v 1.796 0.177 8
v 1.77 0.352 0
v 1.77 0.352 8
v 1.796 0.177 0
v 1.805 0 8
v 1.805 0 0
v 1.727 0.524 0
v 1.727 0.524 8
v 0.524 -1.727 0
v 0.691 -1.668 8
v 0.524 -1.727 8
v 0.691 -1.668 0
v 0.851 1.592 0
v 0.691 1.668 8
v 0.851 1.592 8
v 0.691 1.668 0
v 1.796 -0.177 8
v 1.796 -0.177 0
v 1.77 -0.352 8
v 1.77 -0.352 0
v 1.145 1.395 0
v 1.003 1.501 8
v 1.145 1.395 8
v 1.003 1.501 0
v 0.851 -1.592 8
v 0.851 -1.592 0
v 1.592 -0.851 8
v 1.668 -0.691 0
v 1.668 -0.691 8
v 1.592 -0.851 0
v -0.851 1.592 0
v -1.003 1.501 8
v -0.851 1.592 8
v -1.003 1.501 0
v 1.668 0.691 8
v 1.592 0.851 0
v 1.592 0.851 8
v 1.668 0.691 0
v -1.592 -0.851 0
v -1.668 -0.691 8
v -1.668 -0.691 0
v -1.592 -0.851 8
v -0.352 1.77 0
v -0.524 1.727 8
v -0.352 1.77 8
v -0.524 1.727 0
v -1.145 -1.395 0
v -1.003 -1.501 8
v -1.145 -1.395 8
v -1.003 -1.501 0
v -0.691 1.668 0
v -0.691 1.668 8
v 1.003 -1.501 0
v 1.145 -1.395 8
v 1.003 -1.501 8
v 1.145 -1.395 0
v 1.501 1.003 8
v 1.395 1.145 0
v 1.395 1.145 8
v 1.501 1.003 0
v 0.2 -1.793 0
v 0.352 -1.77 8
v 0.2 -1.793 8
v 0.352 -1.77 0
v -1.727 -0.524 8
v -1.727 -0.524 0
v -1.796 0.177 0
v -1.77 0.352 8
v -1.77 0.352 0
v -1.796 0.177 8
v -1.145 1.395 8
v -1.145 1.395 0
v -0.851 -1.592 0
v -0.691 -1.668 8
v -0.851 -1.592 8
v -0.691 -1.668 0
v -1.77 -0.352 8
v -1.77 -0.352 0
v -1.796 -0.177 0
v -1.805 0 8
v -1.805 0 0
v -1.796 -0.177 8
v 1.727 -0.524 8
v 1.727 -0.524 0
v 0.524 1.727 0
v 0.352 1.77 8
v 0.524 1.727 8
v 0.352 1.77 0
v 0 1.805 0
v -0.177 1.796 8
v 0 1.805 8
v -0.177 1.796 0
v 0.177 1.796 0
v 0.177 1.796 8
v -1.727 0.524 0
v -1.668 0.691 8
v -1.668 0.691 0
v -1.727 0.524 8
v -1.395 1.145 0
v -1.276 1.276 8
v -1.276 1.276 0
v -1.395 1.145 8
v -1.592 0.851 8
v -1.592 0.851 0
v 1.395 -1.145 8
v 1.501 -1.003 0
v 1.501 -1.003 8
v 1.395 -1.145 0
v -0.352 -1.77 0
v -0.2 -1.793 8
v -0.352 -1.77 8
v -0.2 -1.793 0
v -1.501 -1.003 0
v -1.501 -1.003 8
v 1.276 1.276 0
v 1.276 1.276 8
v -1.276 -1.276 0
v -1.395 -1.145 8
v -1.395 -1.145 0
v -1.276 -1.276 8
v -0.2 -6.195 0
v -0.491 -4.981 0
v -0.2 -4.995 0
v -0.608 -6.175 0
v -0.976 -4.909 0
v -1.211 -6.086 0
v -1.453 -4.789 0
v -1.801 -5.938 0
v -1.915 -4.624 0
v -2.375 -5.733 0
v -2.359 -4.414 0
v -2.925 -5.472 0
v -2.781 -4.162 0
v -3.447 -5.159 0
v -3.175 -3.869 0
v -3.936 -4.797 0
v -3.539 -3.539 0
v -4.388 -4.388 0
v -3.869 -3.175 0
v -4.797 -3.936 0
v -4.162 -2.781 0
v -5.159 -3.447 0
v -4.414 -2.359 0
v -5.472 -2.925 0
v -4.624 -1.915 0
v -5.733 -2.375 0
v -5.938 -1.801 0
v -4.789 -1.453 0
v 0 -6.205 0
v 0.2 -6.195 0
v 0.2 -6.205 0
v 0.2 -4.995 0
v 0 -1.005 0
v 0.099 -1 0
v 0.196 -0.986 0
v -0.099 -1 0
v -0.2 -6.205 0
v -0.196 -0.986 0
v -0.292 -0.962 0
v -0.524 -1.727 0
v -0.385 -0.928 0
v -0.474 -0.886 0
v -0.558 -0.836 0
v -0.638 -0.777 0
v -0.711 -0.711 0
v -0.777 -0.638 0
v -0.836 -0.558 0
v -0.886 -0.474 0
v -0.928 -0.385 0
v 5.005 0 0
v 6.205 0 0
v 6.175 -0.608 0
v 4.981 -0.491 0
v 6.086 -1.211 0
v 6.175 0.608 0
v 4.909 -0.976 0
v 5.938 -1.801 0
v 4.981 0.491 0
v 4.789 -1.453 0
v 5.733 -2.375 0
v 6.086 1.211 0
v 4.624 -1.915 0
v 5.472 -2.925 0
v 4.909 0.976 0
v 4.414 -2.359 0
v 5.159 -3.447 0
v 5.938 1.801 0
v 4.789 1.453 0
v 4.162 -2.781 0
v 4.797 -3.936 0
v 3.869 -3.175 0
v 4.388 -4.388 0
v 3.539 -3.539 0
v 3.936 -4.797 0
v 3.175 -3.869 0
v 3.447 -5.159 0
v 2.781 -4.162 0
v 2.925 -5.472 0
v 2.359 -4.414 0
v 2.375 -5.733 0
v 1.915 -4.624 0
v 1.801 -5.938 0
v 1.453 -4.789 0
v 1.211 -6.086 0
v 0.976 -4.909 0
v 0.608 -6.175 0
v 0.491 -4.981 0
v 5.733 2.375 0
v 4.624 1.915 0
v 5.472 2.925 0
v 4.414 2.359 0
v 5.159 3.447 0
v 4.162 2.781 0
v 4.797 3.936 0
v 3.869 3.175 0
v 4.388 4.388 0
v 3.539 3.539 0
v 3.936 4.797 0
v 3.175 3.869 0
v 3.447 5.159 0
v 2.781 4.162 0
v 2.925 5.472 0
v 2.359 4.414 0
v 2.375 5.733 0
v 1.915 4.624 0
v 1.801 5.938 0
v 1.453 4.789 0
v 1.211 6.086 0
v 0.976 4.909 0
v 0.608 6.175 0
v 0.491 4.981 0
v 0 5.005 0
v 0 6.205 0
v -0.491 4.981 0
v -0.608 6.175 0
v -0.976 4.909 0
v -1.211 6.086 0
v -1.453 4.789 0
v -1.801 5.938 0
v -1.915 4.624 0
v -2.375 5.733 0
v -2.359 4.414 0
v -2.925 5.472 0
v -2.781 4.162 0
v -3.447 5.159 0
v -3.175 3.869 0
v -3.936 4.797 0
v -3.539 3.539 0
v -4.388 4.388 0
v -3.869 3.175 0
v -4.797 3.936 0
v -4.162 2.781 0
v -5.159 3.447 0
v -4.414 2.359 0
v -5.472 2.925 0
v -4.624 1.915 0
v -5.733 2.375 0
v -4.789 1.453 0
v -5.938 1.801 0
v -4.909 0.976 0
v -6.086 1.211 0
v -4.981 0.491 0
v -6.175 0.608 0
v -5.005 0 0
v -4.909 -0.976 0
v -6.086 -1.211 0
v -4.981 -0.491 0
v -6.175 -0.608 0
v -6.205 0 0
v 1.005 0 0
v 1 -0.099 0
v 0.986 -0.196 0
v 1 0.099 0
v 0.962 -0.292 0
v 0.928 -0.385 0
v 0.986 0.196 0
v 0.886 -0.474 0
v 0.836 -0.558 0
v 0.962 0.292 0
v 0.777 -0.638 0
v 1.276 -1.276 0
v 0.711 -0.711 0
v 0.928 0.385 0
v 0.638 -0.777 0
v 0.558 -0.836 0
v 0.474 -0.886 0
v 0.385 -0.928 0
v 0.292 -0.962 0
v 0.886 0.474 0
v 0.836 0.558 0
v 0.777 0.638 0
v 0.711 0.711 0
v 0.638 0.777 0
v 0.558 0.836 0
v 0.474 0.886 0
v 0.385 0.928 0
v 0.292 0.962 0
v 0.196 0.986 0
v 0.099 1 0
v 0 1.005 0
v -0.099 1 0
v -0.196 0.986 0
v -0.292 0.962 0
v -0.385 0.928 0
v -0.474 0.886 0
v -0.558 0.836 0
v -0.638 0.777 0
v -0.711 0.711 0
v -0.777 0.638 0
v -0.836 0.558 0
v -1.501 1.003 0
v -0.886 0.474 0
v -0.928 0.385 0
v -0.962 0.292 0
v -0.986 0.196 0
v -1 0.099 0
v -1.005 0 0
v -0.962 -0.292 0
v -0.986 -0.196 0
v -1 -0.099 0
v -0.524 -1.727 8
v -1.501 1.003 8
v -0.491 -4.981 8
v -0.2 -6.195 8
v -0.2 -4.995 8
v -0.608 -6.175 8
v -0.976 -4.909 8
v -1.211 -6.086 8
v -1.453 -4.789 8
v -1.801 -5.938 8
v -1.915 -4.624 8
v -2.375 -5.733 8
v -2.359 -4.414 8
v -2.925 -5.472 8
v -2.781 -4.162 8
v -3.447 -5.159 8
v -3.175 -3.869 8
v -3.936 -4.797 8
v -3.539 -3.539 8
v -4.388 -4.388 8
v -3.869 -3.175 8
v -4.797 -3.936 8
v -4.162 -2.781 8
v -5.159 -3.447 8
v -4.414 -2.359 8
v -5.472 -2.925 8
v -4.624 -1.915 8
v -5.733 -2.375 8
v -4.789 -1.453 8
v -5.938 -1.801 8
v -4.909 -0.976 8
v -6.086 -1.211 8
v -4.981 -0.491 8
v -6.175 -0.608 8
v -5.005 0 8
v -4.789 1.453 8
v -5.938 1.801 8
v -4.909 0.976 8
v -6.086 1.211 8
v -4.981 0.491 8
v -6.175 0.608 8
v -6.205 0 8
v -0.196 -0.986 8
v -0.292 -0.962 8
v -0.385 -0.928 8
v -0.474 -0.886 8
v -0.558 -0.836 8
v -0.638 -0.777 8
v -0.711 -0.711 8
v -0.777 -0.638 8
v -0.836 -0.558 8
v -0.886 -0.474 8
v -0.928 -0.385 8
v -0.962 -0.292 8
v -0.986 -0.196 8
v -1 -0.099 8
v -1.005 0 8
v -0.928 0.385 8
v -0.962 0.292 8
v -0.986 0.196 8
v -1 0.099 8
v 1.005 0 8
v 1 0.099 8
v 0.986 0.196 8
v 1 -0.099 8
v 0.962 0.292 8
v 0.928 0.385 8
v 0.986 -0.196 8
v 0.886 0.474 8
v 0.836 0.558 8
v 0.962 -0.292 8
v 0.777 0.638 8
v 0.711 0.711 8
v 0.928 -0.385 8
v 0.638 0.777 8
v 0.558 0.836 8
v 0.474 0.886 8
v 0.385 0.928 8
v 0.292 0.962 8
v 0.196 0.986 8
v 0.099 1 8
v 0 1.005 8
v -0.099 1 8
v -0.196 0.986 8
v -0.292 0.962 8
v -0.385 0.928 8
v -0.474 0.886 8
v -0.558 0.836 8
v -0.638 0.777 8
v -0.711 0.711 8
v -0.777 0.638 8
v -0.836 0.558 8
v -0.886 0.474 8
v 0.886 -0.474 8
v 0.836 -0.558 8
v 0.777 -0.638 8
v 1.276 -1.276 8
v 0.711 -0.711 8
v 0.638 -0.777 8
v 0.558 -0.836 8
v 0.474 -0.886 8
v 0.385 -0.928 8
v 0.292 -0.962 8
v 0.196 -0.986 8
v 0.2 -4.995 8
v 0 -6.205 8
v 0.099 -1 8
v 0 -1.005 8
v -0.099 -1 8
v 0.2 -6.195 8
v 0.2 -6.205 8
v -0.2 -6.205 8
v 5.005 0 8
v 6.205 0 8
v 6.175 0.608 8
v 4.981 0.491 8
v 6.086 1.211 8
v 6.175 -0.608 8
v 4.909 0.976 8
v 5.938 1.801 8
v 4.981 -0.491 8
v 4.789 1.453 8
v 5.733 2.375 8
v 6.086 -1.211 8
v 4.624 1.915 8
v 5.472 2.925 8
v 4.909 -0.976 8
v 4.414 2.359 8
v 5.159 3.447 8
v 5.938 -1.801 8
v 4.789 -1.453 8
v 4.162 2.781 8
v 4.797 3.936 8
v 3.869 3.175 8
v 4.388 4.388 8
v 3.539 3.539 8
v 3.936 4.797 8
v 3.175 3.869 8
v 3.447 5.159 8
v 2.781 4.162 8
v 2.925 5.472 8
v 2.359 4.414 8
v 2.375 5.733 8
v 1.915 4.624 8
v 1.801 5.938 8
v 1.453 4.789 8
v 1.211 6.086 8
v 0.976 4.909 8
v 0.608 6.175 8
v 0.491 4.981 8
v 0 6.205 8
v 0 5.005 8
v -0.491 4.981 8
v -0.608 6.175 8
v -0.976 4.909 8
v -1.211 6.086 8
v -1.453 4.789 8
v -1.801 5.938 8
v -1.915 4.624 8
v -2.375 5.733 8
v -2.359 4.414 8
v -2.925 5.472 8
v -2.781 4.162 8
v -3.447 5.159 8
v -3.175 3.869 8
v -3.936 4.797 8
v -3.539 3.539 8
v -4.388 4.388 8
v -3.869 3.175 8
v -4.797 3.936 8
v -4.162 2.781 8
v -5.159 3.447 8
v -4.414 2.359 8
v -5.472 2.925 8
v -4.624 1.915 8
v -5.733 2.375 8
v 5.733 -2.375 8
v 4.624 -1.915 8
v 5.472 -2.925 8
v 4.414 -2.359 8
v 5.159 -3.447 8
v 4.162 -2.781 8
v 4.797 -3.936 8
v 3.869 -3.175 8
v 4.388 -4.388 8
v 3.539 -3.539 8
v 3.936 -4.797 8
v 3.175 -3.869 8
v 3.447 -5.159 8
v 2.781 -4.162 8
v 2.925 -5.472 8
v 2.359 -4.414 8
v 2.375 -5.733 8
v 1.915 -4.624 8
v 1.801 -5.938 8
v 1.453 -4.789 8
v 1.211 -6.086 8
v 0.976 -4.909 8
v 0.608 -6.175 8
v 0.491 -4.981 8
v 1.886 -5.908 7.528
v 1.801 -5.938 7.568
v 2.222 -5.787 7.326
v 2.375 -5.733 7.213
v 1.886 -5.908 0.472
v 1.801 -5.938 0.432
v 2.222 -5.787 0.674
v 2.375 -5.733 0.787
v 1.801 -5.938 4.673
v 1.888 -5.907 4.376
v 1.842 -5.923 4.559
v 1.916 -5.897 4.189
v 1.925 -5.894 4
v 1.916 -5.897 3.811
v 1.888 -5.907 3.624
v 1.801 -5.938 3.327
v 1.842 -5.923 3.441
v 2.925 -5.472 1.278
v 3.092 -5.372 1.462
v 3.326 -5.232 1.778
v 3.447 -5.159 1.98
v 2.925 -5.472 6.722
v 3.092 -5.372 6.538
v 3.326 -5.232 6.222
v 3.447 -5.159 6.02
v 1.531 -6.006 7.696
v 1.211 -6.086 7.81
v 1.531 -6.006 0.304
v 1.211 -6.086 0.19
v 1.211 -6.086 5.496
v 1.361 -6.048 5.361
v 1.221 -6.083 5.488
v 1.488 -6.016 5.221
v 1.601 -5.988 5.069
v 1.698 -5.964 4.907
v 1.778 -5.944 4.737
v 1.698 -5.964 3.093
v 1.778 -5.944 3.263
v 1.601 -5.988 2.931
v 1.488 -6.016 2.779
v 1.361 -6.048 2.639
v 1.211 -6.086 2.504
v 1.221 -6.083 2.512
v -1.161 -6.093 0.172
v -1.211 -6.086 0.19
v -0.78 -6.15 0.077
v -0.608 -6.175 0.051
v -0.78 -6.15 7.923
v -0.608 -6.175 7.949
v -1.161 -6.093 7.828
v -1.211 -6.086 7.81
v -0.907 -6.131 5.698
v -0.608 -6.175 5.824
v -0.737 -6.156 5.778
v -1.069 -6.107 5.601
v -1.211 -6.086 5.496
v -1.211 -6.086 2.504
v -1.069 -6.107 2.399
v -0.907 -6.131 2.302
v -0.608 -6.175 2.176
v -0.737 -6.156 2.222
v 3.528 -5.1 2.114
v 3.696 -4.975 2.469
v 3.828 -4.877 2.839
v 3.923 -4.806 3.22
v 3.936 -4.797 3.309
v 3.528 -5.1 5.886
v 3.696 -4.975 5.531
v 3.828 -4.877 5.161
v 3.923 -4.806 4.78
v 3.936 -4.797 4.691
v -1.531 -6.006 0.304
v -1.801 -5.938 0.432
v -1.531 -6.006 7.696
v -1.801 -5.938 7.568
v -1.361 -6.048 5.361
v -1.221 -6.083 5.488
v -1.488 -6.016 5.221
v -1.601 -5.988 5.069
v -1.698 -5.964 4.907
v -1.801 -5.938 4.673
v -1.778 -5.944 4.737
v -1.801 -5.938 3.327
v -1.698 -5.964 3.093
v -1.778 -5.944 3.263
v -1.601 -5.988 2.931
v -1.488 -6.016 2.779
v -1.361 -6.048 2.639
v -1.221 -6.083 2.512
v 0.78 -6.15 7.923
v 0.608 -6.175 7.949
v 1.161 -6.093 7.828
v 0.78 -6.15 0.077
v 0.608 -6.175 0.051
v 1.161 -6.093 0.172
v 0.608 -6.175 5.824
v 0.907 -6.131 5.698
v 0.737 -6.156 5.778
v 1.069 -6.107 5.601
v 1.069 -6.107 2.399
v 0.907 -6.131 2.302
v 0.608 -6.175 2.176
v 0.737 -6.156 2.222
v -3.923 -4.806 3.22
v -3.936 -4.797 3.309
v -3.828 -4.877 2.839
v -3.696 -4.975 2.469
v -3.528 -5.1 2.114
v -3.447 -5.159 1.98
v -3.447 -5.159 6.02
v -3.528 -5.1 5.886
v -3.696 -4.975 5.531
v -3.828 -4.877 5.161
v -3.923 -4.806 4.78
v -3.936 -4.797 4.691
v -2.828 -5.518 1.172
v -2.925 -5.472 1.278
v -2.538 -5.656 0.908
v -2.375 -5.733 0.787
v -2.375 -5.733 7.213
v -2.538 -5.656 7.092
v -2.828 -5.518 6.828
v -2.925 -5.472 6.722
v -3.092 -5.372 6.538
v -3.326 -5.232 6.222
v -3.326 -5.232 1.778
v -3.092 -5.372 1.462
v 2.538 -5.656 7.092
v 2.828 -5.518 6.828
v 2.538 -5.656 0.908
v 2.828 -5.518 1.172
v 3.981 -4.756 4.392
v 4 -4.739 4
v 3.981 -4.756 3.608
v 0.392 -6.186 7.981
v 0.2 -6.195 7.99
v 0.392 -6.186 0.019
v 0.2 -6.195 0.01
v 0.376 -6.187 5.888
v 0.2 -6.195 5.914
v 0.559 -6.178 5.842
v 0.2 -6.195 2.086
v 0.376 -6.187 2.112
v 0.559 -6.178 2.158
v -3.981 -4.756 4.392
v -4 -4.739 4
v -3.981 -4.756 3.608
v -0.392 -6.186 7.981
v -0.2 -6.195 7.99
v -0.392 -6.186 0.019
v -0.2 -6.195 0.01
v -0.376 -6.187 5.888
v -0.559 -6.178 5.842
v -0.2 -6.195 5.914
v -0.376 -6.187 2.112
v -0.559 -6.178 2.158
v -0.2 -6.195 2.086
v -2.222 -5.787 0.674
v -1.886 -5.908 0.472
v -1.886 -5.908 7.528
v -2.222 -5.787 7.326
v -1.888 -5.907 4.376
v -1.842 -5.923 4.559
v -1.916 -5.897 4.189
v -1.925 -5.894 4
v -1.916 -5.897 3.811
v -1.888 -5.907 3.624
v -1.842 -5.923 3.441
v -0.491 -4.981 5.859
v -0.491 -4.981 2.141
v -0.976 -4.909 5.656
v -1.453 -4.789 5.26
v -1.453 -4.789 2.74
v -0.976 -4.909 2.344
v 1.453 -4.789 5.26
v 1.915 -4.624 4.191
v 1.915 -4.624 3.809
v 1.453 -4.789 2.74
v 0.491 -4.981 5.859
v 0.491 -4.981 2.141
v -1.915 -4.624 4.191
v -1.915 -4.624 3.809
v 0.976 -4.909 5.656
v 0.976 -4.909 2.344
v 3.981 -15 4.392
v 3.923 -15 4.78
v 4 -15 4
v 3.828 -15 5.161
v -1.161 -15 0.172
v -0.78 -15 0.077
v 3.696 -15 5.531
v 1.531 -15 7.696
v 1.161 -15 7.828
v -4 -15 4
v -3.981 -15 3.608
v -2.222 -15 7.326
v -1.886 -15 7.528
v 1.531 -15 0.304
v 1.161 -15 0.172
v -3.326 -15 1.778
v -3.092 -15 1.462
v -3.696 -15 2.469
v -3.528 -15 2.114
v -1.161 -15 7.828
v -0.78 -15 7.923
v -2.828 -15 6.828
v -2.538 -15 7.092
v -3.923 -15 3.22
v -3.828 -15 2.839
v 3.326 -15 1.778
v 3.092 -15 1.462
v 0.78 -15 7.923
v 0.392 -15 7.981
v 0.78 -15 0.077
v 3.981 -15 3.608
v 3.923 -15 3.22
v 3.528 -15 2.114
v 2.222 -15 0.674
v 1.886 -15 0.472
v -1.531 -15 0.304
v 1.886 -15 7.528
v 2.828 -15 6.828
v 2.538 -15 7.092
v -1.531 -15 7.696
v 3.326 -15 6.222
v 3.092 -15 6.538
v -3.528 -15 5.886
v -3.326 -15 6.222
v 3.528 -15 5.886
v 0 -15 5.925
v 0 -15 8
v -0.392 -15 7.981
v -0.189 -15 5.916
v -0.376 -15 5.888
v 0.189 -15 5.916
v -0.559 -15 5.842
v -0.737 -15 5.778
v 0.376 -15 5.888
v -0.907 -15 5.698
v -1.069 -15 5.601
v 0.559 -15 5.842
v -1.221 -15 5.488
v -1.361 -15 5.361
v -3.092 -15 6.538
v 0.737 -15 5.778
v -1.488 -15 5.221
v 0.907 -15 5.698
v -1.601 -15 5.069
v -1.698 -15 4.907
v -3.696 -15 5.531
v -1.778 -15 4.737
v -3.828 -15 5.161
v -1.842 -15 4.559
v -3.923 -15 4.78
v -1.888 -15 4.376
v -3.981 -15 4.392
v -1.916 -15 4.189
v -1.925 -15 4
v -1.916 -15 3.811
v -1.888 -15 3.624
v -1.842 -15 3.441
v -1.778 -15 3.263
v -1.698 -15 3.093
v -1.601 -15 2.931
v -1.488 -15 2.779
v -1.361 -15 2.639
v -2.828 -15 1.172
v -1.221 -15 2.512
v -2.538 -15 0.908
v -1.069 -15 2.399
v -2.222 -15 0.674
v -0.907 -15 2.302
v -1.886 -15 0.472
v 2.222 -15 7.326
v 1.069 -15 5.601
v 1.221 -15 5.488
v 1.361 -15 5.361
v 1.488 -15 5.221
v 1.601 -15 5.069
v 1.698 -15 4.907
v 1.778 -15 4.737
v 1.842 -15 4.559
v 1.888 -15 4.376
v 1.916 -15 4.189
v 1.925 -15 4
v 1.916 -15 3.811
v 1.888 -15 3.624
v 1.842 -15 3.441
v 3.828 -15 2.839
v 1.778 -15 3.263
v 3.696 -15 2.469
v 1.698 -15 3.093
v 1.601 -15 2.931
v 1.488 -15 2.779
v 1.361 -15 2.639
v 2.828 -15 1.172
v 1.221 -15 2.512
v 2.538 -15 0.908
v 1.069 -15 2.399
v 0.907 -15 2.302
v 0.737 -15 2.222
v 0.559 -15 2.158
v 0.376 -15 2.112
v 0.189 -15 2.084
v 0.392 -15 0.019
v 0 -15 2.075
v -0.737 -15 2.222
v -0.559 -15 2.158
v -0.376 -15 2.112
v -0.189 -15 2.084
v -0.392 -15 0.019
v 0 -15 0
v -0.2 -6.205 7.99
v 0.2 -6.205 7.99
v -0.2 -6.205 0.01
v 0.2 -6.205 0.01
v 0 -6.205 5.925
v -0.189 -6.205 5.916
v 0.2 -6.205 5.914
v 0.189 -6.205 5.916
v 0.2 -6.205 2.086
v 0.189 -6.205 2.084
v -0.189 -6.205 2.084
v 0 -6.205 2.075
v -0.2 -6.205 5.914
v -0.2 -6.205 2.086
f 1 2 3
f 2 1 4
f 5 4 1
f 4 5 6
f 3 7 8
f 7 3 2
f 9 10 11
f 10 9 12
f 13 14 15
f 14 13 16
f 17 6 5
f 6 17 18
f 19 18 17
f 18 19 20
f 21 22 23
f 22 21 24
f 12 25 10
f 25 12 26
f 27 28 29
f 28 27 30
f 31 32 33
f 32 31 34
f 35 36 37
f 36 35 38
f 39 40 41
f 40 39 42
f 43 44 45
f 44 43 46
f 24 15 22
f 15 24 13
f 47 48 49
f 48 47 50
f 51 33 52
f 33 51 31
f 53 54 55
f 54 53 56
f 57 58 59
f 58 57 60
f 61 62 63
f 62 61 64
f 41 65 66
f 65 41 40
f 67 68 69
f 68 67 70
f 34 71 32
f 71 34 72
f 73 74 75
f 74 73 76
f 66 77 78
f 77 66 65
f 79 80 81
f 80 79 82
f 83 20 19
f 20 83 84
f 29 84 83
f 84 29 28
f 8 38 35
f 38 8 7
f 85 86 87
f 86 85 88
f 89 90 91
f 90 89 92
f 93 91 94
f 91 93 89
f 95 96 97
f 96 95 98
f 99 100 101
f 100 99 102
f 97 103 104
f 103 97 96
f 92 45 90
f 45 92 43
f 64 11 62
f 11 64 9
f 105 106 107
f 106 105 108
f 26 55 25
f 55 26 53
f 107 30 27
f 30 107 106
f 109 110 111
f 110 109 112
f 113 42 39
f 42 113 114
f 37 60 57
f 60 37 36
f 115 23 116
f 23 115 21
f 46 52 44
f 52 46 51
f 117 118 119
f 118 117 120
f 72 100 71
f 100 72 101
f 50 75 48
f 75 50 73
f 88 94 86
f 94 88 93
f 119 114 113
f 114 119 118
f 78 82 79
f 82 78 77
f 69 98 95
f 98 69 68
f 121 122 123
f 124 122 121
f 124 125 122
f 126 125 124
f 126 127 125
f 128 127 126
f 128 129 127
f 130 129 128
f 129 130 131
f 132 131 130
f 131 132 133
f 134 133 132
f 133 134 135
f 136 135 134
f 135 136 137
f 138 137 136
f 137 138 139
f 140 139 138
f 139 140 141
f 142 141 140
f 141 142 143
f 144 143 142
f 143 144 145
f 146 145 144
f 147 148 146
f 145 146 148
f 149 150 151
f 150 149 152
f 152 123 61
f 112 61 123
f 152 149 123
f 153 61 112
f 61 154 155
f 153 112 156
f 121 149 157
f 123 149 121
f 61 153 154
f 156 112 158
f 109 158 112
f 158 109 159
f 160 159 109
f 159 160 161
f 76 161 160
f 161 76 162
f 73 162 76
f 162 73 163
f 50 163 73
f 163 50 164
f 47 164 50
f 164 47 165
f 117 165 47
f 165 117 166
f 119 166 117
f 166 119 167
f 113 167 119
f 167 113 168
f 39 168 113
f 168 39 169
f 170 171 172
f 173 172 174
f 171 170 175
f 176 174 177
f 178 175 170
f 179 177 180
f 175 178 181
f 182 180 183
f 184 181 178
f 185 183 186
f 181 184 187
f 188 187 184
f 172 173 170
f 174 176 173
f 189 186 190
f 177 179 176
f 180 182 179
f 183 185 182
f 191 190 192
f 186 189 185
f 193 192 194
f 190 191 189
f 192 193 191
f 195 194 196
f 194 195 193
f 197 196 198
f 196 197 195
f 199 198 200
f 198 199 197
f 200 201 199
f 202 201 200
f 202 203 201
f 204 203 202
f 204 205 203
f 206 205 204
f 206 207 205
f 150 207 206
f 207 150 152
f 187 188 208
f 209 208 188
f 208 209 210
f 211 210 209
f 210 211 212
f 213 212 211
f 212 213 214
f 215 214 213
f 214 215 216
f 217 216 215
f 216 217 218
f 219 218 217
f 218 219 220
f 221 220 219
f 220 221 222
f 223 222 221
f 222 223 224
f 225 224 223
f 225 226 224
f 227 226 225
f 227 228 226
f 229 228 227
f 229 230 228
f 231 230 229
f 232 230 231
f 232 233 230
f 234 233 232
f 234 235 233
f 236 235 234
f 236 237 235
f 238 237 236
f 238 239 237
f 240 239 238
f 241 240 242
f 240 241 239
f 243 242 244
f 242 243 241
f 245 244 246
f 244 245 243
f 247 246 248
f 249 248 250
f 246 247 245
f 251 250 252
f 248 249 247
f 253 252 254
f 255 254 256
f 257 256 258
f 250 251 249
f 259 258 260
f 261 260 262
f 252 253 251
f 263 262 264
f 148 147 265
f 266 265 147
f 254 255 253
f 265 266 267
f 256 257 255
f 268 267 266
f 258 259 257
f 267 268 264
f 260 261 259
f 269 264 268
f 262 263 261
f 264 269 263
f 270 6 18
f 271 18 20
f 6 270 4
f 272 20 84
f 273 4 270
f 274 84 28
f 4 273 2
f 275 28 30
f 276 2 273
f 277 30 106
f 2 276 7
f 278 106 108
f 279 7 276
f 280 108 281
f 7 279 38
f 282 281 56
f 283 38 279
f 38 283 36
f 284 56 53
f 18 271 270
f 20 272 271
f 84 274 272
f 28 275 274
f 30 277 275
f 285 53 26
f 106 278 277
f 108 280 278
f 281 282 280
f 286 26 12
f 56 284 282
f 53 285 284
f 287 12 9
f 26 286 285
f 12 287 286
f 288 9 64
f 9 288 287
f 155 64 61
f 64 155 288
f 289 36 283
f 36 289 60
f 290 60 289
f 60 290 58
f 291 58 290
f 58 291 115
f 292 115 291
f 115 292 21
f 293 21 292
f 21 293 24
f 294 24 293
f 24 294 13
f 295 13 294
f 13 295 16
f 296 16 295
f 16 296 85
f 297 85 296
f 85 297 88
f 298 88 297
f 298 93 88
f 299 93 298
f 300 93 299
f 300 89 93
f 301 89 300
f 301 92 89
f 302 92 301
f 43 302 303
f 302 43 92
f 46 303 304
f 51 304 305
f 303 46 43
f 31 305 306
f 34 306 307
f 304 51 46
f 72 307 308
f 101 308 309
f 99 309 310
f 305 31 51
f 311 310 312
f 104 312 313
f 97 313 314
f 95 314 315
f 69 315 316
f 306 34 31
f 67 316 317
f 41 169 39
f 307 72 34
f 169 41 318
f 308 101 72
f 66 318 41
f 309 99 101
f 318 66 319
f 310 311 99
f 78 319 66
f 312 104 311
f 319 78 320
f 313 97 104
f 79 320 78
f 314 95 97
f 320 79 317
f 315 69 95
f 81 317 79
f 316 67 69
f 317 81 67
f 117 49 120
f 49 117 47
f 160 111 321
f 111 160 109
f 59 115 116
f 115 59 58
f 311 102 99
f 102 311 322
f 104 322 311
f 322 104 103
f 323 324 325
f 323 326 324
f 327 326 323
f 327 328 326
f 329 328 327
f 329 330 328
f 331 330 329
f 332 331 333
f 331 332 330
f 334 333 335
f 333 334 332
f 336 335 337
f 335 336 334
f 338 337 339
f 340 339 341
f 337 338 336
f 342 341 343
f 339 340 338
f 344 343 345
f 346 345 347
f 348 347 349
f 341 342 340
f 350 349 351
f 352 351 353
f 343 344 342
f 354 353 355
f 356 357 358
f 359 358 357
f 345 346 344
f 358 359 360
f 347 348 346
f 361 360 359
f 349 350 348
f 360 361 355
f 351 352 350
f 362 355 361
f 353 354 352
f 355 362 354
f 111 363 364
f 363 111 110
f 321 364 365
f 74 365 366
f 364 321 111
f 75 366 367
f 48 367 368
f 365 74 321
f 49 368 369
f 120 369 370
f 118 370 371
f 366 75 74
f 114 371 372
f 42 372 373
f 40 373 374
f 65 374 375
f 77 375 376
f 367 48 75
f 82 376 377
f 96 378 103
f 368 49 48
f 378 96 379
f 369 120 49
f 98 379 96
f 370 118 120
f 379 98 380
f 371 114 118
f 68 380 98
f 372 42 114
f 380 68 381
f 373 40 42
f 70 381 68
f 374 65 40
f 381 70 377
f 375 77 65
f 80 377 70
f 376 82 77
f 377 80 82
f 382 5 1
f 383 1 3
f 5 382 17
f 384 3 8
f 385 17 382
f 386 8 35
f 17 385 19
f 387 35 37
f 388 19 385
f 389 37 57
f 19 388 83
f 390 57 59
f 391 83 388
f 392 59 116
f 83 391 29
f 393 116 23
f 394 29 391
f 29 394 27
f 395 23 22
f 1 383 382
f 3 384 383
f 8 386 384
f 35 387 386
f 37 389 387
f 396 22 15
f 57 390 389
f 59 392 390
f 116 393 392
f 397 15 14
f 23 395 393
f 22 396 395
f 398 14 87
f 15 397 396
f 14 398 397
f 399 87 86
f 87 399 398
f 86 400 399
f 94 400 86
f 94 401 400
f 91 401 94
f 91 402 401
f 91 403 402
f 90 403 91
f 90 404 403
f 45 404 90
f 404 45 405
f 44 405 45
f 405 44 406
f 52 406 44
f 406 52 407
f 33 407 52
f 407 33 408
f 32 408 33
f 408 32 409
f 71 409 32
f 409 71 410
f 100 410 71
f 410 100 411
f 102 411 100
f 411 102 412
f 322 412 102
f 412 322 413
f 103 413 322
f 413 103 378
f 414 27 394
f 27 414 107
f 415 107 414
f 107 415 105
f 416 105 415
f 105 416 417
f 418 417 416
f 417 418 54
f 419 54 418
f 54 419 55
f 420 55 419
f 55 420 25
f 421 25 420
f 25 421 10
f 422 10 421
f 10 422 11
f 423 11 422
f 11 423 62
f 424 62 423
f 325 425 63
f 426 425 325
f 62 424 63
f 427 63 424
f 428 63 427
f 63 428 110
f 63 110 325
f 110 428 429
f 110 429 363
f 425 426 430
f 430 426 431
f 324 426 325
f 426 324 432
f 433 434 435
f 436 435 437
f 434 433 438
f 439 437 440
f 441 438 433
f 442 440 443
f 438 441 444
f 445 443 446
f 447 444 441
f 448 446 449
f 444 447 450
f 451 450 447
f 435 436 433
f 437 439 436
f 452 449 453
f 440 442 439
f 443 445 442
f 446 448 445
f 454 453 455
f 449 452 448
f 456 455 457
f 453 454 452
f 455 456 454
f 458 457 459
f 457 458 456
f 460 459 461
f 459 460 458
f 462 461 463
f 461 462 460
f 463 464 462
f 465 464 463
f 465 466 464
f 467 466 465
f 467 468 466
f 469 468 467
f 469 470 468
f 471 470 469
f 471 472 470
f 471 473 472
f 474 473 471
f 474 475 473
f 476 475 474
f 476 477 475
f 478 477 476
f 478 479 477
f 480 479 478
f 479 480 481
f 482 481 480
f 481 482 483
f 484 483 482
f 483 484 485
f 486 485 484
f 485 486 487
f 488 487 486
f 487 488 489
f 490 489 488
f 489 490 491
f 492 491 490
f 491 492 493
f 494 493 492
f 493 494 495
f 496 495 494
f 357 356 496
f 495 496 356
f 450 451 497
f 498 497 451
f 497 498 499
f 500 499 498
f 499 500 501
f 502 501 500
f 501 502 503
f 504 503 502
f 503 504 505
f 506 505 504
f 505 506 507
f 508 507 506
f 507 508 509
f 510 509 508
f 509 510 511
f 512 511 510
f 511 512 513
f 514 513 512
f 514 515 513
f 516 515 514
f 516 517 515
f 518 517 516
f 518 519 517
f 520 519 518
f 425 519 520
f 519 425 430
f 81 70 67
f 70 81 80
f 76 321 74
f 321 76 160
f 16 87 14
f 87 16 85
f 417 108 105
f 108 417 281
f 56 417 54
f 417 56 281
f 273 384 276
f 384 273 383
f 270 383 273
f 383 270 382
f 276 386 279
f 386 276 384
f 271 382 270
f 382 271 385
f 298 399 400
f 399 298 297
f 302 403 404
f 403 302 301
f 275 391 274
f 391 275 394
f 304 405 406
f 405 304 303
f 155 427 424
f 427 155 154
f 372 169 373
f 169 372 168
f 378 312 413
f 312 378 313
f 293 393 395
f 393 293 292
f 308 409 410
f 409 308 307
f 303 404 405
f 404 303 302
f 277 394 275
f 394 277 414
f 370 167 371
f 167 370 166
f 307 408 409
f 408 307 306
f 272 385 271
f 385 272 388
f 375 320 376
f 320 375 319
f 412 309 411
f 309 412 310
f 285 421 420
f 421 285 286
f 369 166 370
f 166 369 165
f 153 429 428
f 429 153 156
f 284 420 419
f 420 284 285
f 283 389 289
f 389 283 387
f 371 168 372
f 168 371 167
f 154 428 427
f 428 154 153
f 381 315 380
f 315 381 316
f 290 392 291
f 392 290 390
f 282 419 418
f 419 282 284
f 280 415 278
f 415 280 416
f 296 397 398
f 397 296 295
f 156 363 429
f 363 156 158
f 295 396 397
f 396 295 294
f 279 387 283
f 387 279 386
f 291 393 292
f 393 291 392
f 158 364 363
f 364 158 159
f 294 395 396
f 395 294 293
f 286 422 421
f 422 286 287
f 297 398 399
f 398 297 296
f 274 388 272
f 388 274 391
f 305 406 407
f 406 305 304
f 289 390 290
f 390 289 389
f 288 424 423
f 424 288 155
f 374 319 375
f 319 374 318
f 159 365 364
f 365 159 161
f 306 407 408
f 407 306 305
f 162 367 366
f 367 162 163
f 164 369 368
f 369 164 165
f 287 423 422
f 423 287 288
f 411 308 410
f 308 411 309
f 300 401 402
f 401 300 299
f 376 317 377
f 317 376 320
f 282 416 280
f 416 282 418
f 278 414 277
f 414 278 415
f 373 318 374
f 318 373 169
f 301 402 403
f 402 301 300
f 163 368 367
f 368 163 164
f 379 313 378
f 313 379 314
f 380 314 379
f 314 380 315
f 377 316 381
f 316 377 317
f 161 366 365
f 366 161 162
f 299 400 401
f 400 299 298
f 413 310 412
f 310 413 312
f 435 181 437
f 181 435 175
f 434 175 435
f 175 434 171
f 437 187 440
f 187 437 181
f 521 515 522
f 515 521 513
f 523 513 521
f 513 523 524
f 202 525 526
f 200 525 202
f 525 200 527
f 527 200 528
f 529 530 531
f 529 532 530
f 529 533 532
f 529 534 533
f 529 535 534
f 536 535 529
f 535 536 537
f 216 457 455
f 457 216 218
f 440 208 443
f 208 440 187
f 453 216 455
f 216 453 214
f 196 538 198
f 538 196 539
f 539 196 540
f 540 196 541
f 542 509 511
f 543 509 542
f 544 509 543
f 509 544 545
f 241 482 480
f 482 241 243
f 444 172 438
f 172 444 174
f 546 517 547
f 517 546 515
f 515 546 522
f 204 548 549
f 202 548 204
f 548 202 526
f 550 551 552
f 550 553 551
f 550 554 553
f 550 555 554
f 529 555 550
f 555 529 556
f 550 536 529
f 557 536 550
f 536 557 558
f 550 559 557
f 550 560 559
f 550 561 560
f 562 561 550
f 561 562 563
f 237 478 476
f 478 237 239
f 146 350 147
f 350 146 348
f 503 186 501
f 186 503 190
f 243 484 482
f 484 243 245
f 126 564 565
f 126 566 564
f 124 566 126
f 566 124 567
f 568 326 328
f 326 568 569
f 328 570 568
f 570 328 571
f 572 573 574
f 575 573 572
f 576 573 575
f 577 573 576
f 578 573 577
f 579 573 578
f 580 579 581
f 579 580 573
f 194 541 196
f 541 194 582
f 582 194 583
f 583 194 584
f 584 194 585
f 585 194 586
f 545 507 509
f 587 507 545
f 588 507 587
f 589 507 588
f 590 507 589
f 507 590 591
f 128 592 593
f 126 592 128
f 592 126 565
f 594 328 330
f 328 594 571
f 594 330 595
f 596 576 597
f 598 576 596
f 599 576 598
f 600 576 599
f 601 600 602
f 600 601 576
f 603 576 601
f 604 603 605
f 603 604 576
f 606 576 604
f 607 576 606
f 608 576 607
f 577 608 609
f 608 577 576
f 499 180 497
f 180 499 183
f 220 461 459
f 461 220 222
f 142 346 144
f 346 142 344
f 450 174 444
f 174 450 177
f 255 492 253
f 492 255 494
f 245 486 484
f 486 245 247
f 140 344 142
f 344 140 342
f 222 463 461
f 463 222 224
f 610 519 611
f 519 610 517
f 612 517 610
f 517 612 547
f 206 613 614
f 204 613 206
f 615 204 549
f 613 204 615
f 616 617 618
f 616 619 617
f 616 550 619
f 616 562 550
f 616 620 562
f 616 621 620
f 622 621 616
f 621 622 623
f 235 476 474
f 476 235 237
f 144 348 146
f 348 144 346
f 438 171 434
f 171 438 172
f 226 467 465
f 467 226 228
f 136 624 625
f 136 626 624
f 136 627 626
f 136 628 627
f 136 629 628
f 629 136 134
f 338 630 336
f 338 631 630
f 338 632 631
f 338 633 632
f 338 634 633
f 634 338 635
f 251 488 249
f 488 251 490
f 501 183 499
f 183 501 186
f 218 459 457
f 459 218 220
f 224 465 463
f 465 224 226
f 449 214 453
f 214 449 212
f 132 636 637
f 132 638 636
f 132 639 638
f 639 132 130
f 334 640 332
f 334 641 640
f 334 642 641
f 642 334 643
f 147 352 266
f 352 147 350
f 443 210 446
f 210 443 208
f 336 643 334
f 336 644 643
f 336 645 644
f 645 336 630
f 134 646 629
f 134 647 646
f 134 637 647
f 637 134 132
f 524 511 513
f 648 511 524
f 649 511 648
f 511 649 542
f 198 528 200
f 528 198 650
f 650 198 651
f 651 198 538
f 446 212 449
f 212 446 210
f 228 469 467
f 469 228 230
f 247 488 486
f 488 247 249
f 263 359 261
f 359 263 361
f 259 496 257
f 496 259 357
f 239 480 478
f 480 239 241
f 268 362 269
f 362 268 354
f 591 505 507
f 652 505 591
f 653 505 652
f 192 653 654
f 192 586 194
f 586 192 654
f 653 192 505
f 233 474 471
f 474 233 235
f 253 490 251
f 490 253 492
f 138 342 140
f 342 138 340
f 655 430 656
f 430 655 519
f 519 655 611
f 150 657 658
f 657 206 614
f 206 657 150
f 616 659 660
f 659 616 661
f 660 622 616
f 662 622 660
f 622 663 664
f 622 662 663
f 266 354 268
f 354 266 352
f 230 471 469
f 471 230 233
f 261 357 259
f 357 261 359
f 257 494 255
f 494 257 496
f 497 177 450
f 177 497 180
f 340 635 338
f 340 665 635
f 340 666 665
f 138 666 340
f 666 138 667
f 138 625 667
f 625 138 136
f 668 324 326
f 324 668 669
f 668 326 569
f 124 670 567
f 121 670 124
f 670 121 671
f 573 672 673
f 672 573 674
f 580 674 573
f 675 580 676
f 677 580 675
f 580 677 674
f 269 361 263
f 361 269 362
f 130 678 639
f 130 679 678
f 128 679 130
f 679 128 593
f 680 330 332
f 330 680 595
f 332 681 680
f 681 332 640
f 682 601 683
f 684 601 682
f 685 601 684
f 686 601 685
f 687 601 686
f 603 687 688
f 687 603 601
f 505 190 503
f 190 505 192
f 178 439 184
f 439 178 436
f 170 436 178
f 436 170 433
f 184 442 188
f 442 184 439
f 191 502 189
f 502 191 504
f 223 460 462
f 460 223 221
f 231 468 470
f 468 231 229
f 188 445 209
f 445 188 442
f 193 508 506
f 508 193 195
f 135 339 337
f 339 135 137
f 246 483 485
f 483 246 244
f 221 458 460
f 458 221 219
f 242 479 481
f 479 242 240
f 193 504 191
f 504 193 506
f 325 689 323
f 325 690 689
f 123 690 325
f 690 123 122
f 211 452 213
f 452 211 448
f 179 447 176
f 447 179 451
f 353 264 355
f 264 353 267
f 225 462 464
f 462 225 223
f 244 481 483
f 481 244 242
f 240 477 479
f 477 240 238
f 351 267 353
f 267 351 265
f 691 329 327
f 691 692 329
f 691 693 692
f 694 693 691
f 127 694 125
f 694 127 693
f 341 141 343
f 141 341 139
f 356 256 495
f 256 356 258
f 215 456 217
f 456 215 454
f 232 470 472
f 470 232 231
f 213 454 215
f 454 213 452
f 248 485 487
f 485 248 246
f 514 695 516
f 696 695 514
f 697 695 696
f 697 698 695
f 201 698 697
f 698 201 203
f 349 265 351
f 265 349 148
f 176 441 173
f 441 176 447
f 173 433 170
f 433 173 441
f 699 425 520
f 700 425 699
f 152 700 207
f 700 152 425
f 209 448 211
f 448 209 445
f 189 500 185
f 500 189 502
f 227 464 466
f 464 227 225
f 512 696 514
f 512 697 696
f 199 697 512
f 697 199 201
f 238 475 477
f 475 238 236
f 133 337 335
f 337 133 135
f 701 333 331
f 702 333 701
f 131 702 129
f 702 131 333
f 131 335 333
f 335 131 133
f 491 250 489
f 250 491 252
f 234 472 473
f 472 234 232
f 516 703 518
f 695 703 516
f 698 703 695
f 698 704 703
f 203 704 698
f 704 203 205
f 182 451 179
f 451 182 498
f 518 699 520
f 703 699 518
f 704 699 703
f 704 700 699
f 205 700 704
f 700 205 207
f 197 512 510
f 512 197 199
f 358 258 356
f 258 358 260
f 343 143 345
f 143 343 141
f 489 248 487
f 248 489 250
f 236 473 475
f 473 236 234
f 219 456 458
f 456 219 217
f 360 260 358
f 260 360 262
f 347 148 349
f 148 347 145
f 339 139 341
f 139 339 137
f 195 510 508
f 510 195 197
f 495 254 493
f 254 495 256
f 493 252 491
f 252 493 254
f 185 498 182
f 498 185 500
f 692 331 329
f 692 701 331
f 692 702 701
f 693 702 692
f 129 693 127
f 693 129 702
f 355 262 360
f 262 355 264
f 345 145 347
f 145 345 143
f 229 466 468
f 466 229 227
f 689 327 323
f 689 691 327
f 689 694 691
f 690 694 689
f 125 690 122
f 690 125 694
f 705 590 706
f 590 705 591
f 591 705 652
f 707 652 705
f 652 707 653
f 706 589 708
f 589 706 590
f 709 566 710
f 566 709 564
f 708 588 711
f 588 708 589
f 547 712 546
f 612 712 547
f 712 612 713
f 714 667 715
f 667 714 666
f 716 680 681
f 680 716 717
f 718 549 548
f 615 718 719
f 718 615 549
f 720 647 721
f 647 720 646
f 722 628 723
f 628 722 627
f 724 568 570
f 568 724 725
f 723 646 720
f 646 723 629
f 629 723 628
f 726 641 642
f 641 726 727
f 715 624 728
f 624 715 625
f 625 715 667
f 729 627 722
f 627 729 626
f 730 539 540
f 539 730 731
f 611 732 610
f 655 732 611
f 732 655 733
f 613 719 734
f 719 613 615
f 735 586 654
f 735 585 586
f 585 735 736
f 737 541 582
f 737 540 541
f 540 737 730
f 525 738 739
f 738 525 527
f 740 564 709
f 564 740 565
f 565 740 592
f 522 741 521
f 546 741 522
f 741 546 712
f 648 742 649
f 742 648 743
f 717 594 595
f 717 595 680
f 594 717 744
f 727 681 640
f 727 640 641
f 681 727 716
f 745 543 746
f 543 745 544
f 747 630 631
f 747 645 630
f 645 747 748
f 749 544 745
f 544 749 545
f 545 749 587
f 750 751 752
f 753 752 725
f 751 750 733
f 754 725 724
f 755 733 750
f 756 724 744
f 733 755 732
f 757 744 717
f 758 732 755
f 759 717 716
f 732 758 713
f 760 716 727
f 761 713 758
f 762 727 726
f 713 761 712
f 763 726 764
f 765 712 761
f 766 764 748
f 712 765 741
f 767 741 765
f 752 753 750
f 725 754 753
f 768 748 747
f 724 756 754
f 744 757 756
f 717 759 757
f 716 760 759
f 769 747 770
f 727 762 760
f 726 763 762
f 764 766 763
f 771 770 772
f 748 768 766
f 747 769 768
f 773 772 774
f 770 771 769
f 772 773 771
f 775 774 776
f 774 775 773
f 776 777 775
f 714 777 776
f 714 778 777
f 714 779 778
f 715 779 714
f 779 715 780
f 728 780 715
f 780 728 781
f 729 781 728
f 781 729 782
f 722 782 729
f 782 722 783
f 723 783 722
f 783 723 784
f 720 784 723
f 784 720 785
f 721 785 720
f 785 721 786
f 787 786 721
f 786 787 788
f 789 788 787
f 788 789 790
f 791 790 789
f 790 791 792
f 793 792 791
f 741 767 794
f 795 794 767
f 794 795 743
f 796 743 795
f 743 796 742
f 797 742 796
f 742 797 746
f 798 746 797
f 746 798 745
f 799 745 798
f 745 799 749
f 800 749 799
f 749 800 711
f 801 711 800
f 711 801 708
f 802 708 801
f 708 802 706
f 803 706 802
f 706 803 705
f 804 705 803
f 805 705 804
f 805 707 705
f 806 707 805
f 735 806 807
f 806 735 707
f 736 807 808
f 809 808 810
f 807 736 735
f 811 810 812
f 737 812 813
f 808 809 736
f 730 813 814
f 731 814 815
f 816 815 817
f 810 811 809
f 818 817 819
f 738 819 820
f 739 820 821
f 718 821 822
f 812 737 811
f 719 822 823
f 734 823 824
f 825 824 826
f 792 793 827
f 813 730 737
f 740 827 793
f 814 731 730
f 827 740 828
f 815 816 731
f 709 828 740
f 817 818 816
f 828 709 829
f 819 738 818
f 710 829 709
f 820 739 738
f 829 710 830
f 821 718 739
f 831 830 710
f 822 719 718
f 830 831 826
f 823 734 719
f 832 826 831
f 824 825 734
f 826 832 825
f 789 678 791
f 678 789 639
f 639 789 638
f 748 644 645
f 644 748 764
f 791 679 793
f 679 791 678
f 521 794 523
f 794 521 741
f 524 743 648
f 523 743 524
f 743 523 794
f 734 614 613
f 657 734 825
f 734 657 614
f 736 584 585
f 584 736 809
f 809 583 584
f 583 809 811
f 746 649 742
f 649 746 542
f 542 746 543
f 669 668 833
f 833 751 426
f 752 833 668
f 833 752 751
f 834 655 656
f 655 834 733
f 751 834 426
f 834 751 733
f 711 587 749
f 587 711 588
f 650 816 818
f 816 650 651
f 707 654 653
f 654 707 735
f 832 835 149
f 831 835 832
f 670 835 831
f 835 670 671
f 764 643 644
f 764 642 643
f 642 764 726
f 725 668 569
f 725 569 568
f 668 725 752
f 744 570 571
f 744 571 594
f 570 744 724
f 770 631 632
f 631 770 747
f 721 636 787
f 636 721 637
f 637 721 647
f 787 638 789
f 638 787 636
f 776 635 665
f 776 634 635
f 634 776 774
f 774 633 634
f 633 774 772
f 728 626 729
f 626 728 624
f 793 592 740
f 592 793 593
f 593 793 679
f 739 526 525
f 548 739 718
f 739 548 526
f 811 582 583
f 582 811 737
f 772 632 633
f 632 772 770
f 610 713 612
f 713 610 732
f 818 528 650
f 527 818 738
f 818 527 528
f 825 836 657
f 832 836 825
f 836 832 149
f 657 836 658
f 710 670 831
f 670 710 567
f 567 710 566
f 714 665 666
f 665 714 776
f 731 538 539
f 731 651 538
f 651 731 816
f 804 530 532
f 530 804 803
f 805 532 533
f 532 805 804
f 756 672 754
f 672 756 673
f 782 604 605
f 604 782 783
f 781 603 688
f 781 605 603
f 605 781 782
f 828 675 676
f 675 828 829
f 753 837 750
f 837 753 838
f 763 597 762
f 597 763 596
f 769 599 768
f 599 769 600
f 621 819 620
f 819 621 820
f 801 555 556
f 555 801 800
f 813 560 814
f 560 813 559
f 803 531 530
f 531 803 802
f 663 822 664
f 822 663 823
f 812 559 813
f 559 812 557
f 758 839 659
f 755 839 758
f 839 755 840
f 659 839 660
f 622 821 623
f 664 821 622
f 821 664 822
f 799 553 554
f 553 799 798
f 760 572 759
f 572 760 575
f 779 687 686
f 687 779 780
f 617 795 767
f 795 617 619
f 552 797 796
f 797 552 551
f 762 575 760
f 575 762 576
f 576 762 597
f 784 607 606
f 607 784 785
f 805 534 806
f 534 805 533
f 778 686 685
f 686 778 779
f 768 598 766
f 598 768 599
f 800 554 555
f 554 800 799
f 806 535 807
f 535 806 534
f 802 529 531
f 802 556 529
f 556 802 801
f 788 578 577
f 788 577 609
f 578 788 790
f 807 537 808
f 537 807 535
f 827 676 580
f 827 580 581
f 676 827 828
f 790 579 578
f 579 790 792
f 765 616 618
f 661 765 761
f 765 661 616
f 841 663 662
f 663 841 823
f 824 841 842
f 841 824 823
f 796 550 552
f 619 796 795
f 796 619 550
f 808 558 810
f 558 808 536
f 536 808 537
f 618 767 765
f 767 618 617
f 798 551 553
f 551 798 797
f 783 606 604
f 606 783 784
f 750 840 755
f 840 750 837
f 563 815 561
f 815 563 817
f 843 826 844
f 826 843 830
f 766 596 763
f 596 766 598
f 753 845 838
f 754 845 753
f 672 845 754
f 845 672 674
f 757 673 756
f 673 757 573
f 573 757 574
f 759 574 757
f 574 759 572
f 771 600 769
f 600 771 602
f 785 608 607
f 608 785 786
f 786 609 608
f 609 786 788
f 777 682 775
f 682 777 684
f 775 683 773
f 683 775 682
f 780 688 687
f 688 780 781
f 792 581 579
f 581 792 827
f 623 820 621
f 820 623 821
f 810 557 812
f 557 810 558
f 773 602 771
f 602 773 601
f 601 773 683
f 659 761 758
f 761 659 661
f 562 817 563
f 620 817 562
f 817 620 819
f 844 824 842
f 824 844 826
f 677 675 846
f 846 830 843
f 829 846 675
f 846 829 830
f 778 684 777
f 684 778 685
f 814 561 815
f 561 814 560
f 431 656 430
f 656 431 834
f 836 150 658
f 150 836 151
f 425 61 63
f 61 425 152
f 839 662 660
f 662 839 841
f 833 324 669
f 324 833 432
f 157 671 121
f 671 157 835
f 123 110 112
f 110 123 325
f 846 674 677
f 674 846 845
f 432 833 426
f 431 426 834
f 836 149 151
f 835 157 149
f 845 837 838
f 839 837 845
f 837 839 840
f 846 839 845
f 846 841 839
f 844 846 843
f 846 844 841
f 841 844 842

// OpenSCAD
// file: common_parts.scad
include <tunable_constants.scad>;
//common_flat_screw_tap();
module M3_flat_screw(l = 10, l2 = 0) {
    // l2 is amount of the screw that are bigger for sliding through the hole
    tap_z = 1.9;
    rotate([180,0,0])
    union() {
        cylinder(d = C_M3_DIAMETER_THREAD, h= l);
        cylinder(d = C_M3_DIAMETER, h= l2);
        translate([0,0,-0.1+0.1]) cylinder(d1 = 6.5, d2= C_M3_DIAMETER_THREAD, h= tap_z);
        translate([0,0,-0.1]) cylinder(d = 6.5, h= 0.3);
    }
}

module M4_button_screw(l = 10, l2 = 0) {
    rotate([180,0,0])
    union() {
        cylinder(d = C_M4_DIAMETER_THREAD, h= l);
        cylinder(d = C_M4_DIAMETER, h= l2);
        translate([0,0,-4]) cylinder(d = 8, h=4);
    }
}
module M3_button_screw(l = 10, l2 = 0) {
    rotate([180,0,0])
    union() {
        cylinder(d = C_M3_DIAMETER_THREAD, h= l);
        cylinder(d = C_M3_DIAMETER, h= l2);
        translate([0,0,-4]) cylinder(d =6, h=4);
    }
}

module roundedcube(xdim ,ydim ,zdim,rdim){
    hull(){
        fn=30;
        translate([rdim,rdim,0]) cylinder(r=rdim, h=zdim, $fn=fn);
        translate([xdim-rdim,rdim,0])cylinder(r=rdim, h=zdim, $fn=fn);

        translate([rdim,ydim-rdim,0]) cylinder(r=rdim, h=zdim, $fn=fn);
        translate([xdim-rdim,ydim-rdim,0]) cylinder(r=rdim, h=zdim, $fn=fn);
    }
}
//beam45();
module beam45(w = 10, l = 10, h = 8) {
    difference() {
        union() {
            translate([-w/2,0,0]) cube([w,l,h]);
        }
        translate([w/2,0,0]) rotate([0,45,0])translate([-w-h,-1,0]) cube([w+h*2,l+2,h*2]);
        translate([-w/2,0,0]) rotate([0,-45,0])translate([0-w,-1,0]) cube([w+h*2,l+2,h*2]);
    }
}
//beam30();
module beam30(w = 10, l = 10, h = 8) {
    difference() {
        union() {
            translate([-w/2,0,0]) cube([w,l,h]);
        }
        translate([w/2,0,0]) rotate([0,90-30,0])translate([-w-h,-1,0]) cube([w+h*2,l+2,h*2]);
        translate([-w/2,0,0]) rotate([0,-90+30,0])translate([0-w,-1,0]) cube([w+h*2,l+2,h*2]);
    }
}

halfbeam30(w = 100, l = 10, h = 8);
module halfbeam30(w = 10, l = 10, h = 8) {
    difference() {
        union() {
            translate([-w/2,0,0]) cube([w,l,h]);
        }
        translate([0,-l*0.1,0])rotate([0,+30,0]) cube([w+l+h,w+l+h+l*0.1,w+l+h]);
        //translate([-w/2,0,0]) rotate([0,-90+30,0])translate([0-w,-1,0]) cube([w+h*2,l+2,h*2]);
    }
}



module cylinder_outer(height,radius,fn){
   fudge = 1/cos(180/fn);
   cylinder(h=height,r=radius*fudge,$fn=fn);
}

//indicator_dots(2);

module indicator_dots(valueIn) {
    for (a =[0:1:valueIn-1]) {
        translate([a*3,0,0]) cube([2,2,1]);
    }
}
// file: tunable_constants.scad
// Change parameters to fit your printer and slicer differences

C_M3_DIAMETER = 3.3; // size of a hole that a M3 screw will slide through
C_M3_DIAMETER_THREAD = 2.8; // size of a hole that a M3 screw will create own threads in

C_M3_NUT = 7;

C_KINGPIN_LOOSE = 3.5; // The hole for kingpin in the arms that are suposed to slide
C_KINGPIN_SNUG = 3.3; // The hole in the steering hub where the kingpin is suposed to be tightly locked with a screw

C_M4_NUT = 8.4;

C_M4_DIAMETER = 4.1; // size of a hole that a M4 screw will slide through
C_M4_DIAMETER_THREAD = 3.8; // size of a hole that a M4 screw will create own threads in

    b_12mm_tol = 0.3; // tolerance for bearing with 12mm diameter

C_12MM_BEARING_D = 12+b_12mm_tol; // Size of a hole that hold a 12mm bearing
C_12MM_BEARING_H = 3.5;

C_8MM_LOOSE = 8.7; // Loose fitting that will guarantie that it will not touch
C_8MM_TIGHT = 8.2; // Tight fitting for indrive etc
C_8MM_FIT = 8.5; // Perfect fit for it to be removable but not by much force, used for left wheel mount

C_SIGHT_MOUNT_S = 33.3375;
C_SIGHT_SCREW_D = 4.7;

C_MOUNT1_W = 28;
// ############# Settings ################
S_CASTER = 4;
S_CAMBER = 2;

S_BAR_W = 25;
S_BAR_H = 5;
// main file
//
include <tunable_constants.scad>;
use <common_parts.scad>

// Pin hole inner diameter
ph = 2.01;

// Small ring width
srw = 0.8;

// Large ring inner diameter
ld = 10.01;

// Large ring width
lrw = 1.2;

// Height
sh = 8;

// mounting shaft diameter
sd = 3.85; // shaft diameter
// mount length
ml = 15;

// Pin holder type
type = 0;//[0:one pin, 1:vertical, 2:horizontal, 3:quad]
// Pin holder width
phw = 0.4;
// Resulution
rs = 64;

litetkorn = 0; //[0:tjock, 1:litet]
korn_z = 2.0;

sightpin();
module sightpin() {
    difference() {
        union() {
            pipe(id = ph, w = srw, h = sh);
            pipe(id = ld, w = lrw, h = sh);
            mountpipe();
            pinholder();
        }
        if (litetkorn == 1) {
            
            translate([0,0,sh-korn_z]) cylinder(d1=ph+srw*2, d2=ld, h=korn_z, $fn=rs);
        }
    }
}

module pipe(id = 10, w = 2, h = 10) {
    difference() {
        union() {
            cylinder(d=id + w*2, h = h, $fn=rs);
            
        }
        translate([0,0,-1]) cylinder(d=id, h = h+2, $fn=rs);
        
    }
}
module mountpipe() {
    difference() {
        union() {
            translate([0,0,sh/2]) rotate([90,0,0]) cylinder(d=sh, h=ml, $fn = rs);
        }
        translate([0,1,sh/2]) rotate([90,0,0]) cylinder(d=sd, h=ml+2, $fn = rs);
        translate([0,0,-1]) cylinder(d=ld, h=ml+2, $fn = rs);
    }
    
}

module pinholder() {
    if(type == 0) {
        difference() {
            translate([-phw/2,-ld/2-lrw,0]) cube([phw, ld/2+lrw, sh]);
            translate([0,0,-1]) cylinder(d=ph, h = sh+2, $fn=rs);
        }
    }
    
    if(type == 1) {
        difference() {
            union() {
                rotate([0,0,90]) translate([-phw/2,-ld/2-lrw,0]) cube([phw, ld/2+lrw, sh]);
                rotate([0,0,-90]) translate([-phw/2,-ld/2-lrw,0]) cube([phw, ld/2+lrw, sh]);
                
            }
            translate([0,0,-1]) cylinder(d=ph, h = sh+2, $fn=rs);
        }
    }
    if(type == 2) {
        difference() {
            union() {
                rotate([0,0,0]) translate([-phw/2,-ld/2-lrw,0]) cube([phw, ld/2+lrw, sh]);
                rotate([0,0,-180]) translate([-phw/2,-ld/2-lrw,0]) cube([phw, ld/2+lrw, sh]);
                
            }
            translate([0,0,-1]) cylinder(d=ph, h = sh+2, $fn=rs);
        }
    }
    if(type == 3) {
        difference() {
            union() {
                rotate([0,0,90]) translate([-phw/2,-ld/2-lrw,0]) cube([phw, ld/2+lrw, sh]);
                rotate([0,0,-90]) translate([-phw/2,-ld/2-lrw,0]) cube([phw, ld/2+lrw, sh]);
                rotate([0,0,0]) translate([-phw/2,-ld/2-lrw,0]) cube([phw, ld/2+lrw, sh]);
                rotate([0,0,-180]) translate([-phw/2,-ld/2-lrw,0]) cube([phw, ld/2+lrw, sh]);
                
            }
            translate([0,0,-1]) cylinder(d=ph, h = sh+2, $fn=rs);
        }
    }
}
